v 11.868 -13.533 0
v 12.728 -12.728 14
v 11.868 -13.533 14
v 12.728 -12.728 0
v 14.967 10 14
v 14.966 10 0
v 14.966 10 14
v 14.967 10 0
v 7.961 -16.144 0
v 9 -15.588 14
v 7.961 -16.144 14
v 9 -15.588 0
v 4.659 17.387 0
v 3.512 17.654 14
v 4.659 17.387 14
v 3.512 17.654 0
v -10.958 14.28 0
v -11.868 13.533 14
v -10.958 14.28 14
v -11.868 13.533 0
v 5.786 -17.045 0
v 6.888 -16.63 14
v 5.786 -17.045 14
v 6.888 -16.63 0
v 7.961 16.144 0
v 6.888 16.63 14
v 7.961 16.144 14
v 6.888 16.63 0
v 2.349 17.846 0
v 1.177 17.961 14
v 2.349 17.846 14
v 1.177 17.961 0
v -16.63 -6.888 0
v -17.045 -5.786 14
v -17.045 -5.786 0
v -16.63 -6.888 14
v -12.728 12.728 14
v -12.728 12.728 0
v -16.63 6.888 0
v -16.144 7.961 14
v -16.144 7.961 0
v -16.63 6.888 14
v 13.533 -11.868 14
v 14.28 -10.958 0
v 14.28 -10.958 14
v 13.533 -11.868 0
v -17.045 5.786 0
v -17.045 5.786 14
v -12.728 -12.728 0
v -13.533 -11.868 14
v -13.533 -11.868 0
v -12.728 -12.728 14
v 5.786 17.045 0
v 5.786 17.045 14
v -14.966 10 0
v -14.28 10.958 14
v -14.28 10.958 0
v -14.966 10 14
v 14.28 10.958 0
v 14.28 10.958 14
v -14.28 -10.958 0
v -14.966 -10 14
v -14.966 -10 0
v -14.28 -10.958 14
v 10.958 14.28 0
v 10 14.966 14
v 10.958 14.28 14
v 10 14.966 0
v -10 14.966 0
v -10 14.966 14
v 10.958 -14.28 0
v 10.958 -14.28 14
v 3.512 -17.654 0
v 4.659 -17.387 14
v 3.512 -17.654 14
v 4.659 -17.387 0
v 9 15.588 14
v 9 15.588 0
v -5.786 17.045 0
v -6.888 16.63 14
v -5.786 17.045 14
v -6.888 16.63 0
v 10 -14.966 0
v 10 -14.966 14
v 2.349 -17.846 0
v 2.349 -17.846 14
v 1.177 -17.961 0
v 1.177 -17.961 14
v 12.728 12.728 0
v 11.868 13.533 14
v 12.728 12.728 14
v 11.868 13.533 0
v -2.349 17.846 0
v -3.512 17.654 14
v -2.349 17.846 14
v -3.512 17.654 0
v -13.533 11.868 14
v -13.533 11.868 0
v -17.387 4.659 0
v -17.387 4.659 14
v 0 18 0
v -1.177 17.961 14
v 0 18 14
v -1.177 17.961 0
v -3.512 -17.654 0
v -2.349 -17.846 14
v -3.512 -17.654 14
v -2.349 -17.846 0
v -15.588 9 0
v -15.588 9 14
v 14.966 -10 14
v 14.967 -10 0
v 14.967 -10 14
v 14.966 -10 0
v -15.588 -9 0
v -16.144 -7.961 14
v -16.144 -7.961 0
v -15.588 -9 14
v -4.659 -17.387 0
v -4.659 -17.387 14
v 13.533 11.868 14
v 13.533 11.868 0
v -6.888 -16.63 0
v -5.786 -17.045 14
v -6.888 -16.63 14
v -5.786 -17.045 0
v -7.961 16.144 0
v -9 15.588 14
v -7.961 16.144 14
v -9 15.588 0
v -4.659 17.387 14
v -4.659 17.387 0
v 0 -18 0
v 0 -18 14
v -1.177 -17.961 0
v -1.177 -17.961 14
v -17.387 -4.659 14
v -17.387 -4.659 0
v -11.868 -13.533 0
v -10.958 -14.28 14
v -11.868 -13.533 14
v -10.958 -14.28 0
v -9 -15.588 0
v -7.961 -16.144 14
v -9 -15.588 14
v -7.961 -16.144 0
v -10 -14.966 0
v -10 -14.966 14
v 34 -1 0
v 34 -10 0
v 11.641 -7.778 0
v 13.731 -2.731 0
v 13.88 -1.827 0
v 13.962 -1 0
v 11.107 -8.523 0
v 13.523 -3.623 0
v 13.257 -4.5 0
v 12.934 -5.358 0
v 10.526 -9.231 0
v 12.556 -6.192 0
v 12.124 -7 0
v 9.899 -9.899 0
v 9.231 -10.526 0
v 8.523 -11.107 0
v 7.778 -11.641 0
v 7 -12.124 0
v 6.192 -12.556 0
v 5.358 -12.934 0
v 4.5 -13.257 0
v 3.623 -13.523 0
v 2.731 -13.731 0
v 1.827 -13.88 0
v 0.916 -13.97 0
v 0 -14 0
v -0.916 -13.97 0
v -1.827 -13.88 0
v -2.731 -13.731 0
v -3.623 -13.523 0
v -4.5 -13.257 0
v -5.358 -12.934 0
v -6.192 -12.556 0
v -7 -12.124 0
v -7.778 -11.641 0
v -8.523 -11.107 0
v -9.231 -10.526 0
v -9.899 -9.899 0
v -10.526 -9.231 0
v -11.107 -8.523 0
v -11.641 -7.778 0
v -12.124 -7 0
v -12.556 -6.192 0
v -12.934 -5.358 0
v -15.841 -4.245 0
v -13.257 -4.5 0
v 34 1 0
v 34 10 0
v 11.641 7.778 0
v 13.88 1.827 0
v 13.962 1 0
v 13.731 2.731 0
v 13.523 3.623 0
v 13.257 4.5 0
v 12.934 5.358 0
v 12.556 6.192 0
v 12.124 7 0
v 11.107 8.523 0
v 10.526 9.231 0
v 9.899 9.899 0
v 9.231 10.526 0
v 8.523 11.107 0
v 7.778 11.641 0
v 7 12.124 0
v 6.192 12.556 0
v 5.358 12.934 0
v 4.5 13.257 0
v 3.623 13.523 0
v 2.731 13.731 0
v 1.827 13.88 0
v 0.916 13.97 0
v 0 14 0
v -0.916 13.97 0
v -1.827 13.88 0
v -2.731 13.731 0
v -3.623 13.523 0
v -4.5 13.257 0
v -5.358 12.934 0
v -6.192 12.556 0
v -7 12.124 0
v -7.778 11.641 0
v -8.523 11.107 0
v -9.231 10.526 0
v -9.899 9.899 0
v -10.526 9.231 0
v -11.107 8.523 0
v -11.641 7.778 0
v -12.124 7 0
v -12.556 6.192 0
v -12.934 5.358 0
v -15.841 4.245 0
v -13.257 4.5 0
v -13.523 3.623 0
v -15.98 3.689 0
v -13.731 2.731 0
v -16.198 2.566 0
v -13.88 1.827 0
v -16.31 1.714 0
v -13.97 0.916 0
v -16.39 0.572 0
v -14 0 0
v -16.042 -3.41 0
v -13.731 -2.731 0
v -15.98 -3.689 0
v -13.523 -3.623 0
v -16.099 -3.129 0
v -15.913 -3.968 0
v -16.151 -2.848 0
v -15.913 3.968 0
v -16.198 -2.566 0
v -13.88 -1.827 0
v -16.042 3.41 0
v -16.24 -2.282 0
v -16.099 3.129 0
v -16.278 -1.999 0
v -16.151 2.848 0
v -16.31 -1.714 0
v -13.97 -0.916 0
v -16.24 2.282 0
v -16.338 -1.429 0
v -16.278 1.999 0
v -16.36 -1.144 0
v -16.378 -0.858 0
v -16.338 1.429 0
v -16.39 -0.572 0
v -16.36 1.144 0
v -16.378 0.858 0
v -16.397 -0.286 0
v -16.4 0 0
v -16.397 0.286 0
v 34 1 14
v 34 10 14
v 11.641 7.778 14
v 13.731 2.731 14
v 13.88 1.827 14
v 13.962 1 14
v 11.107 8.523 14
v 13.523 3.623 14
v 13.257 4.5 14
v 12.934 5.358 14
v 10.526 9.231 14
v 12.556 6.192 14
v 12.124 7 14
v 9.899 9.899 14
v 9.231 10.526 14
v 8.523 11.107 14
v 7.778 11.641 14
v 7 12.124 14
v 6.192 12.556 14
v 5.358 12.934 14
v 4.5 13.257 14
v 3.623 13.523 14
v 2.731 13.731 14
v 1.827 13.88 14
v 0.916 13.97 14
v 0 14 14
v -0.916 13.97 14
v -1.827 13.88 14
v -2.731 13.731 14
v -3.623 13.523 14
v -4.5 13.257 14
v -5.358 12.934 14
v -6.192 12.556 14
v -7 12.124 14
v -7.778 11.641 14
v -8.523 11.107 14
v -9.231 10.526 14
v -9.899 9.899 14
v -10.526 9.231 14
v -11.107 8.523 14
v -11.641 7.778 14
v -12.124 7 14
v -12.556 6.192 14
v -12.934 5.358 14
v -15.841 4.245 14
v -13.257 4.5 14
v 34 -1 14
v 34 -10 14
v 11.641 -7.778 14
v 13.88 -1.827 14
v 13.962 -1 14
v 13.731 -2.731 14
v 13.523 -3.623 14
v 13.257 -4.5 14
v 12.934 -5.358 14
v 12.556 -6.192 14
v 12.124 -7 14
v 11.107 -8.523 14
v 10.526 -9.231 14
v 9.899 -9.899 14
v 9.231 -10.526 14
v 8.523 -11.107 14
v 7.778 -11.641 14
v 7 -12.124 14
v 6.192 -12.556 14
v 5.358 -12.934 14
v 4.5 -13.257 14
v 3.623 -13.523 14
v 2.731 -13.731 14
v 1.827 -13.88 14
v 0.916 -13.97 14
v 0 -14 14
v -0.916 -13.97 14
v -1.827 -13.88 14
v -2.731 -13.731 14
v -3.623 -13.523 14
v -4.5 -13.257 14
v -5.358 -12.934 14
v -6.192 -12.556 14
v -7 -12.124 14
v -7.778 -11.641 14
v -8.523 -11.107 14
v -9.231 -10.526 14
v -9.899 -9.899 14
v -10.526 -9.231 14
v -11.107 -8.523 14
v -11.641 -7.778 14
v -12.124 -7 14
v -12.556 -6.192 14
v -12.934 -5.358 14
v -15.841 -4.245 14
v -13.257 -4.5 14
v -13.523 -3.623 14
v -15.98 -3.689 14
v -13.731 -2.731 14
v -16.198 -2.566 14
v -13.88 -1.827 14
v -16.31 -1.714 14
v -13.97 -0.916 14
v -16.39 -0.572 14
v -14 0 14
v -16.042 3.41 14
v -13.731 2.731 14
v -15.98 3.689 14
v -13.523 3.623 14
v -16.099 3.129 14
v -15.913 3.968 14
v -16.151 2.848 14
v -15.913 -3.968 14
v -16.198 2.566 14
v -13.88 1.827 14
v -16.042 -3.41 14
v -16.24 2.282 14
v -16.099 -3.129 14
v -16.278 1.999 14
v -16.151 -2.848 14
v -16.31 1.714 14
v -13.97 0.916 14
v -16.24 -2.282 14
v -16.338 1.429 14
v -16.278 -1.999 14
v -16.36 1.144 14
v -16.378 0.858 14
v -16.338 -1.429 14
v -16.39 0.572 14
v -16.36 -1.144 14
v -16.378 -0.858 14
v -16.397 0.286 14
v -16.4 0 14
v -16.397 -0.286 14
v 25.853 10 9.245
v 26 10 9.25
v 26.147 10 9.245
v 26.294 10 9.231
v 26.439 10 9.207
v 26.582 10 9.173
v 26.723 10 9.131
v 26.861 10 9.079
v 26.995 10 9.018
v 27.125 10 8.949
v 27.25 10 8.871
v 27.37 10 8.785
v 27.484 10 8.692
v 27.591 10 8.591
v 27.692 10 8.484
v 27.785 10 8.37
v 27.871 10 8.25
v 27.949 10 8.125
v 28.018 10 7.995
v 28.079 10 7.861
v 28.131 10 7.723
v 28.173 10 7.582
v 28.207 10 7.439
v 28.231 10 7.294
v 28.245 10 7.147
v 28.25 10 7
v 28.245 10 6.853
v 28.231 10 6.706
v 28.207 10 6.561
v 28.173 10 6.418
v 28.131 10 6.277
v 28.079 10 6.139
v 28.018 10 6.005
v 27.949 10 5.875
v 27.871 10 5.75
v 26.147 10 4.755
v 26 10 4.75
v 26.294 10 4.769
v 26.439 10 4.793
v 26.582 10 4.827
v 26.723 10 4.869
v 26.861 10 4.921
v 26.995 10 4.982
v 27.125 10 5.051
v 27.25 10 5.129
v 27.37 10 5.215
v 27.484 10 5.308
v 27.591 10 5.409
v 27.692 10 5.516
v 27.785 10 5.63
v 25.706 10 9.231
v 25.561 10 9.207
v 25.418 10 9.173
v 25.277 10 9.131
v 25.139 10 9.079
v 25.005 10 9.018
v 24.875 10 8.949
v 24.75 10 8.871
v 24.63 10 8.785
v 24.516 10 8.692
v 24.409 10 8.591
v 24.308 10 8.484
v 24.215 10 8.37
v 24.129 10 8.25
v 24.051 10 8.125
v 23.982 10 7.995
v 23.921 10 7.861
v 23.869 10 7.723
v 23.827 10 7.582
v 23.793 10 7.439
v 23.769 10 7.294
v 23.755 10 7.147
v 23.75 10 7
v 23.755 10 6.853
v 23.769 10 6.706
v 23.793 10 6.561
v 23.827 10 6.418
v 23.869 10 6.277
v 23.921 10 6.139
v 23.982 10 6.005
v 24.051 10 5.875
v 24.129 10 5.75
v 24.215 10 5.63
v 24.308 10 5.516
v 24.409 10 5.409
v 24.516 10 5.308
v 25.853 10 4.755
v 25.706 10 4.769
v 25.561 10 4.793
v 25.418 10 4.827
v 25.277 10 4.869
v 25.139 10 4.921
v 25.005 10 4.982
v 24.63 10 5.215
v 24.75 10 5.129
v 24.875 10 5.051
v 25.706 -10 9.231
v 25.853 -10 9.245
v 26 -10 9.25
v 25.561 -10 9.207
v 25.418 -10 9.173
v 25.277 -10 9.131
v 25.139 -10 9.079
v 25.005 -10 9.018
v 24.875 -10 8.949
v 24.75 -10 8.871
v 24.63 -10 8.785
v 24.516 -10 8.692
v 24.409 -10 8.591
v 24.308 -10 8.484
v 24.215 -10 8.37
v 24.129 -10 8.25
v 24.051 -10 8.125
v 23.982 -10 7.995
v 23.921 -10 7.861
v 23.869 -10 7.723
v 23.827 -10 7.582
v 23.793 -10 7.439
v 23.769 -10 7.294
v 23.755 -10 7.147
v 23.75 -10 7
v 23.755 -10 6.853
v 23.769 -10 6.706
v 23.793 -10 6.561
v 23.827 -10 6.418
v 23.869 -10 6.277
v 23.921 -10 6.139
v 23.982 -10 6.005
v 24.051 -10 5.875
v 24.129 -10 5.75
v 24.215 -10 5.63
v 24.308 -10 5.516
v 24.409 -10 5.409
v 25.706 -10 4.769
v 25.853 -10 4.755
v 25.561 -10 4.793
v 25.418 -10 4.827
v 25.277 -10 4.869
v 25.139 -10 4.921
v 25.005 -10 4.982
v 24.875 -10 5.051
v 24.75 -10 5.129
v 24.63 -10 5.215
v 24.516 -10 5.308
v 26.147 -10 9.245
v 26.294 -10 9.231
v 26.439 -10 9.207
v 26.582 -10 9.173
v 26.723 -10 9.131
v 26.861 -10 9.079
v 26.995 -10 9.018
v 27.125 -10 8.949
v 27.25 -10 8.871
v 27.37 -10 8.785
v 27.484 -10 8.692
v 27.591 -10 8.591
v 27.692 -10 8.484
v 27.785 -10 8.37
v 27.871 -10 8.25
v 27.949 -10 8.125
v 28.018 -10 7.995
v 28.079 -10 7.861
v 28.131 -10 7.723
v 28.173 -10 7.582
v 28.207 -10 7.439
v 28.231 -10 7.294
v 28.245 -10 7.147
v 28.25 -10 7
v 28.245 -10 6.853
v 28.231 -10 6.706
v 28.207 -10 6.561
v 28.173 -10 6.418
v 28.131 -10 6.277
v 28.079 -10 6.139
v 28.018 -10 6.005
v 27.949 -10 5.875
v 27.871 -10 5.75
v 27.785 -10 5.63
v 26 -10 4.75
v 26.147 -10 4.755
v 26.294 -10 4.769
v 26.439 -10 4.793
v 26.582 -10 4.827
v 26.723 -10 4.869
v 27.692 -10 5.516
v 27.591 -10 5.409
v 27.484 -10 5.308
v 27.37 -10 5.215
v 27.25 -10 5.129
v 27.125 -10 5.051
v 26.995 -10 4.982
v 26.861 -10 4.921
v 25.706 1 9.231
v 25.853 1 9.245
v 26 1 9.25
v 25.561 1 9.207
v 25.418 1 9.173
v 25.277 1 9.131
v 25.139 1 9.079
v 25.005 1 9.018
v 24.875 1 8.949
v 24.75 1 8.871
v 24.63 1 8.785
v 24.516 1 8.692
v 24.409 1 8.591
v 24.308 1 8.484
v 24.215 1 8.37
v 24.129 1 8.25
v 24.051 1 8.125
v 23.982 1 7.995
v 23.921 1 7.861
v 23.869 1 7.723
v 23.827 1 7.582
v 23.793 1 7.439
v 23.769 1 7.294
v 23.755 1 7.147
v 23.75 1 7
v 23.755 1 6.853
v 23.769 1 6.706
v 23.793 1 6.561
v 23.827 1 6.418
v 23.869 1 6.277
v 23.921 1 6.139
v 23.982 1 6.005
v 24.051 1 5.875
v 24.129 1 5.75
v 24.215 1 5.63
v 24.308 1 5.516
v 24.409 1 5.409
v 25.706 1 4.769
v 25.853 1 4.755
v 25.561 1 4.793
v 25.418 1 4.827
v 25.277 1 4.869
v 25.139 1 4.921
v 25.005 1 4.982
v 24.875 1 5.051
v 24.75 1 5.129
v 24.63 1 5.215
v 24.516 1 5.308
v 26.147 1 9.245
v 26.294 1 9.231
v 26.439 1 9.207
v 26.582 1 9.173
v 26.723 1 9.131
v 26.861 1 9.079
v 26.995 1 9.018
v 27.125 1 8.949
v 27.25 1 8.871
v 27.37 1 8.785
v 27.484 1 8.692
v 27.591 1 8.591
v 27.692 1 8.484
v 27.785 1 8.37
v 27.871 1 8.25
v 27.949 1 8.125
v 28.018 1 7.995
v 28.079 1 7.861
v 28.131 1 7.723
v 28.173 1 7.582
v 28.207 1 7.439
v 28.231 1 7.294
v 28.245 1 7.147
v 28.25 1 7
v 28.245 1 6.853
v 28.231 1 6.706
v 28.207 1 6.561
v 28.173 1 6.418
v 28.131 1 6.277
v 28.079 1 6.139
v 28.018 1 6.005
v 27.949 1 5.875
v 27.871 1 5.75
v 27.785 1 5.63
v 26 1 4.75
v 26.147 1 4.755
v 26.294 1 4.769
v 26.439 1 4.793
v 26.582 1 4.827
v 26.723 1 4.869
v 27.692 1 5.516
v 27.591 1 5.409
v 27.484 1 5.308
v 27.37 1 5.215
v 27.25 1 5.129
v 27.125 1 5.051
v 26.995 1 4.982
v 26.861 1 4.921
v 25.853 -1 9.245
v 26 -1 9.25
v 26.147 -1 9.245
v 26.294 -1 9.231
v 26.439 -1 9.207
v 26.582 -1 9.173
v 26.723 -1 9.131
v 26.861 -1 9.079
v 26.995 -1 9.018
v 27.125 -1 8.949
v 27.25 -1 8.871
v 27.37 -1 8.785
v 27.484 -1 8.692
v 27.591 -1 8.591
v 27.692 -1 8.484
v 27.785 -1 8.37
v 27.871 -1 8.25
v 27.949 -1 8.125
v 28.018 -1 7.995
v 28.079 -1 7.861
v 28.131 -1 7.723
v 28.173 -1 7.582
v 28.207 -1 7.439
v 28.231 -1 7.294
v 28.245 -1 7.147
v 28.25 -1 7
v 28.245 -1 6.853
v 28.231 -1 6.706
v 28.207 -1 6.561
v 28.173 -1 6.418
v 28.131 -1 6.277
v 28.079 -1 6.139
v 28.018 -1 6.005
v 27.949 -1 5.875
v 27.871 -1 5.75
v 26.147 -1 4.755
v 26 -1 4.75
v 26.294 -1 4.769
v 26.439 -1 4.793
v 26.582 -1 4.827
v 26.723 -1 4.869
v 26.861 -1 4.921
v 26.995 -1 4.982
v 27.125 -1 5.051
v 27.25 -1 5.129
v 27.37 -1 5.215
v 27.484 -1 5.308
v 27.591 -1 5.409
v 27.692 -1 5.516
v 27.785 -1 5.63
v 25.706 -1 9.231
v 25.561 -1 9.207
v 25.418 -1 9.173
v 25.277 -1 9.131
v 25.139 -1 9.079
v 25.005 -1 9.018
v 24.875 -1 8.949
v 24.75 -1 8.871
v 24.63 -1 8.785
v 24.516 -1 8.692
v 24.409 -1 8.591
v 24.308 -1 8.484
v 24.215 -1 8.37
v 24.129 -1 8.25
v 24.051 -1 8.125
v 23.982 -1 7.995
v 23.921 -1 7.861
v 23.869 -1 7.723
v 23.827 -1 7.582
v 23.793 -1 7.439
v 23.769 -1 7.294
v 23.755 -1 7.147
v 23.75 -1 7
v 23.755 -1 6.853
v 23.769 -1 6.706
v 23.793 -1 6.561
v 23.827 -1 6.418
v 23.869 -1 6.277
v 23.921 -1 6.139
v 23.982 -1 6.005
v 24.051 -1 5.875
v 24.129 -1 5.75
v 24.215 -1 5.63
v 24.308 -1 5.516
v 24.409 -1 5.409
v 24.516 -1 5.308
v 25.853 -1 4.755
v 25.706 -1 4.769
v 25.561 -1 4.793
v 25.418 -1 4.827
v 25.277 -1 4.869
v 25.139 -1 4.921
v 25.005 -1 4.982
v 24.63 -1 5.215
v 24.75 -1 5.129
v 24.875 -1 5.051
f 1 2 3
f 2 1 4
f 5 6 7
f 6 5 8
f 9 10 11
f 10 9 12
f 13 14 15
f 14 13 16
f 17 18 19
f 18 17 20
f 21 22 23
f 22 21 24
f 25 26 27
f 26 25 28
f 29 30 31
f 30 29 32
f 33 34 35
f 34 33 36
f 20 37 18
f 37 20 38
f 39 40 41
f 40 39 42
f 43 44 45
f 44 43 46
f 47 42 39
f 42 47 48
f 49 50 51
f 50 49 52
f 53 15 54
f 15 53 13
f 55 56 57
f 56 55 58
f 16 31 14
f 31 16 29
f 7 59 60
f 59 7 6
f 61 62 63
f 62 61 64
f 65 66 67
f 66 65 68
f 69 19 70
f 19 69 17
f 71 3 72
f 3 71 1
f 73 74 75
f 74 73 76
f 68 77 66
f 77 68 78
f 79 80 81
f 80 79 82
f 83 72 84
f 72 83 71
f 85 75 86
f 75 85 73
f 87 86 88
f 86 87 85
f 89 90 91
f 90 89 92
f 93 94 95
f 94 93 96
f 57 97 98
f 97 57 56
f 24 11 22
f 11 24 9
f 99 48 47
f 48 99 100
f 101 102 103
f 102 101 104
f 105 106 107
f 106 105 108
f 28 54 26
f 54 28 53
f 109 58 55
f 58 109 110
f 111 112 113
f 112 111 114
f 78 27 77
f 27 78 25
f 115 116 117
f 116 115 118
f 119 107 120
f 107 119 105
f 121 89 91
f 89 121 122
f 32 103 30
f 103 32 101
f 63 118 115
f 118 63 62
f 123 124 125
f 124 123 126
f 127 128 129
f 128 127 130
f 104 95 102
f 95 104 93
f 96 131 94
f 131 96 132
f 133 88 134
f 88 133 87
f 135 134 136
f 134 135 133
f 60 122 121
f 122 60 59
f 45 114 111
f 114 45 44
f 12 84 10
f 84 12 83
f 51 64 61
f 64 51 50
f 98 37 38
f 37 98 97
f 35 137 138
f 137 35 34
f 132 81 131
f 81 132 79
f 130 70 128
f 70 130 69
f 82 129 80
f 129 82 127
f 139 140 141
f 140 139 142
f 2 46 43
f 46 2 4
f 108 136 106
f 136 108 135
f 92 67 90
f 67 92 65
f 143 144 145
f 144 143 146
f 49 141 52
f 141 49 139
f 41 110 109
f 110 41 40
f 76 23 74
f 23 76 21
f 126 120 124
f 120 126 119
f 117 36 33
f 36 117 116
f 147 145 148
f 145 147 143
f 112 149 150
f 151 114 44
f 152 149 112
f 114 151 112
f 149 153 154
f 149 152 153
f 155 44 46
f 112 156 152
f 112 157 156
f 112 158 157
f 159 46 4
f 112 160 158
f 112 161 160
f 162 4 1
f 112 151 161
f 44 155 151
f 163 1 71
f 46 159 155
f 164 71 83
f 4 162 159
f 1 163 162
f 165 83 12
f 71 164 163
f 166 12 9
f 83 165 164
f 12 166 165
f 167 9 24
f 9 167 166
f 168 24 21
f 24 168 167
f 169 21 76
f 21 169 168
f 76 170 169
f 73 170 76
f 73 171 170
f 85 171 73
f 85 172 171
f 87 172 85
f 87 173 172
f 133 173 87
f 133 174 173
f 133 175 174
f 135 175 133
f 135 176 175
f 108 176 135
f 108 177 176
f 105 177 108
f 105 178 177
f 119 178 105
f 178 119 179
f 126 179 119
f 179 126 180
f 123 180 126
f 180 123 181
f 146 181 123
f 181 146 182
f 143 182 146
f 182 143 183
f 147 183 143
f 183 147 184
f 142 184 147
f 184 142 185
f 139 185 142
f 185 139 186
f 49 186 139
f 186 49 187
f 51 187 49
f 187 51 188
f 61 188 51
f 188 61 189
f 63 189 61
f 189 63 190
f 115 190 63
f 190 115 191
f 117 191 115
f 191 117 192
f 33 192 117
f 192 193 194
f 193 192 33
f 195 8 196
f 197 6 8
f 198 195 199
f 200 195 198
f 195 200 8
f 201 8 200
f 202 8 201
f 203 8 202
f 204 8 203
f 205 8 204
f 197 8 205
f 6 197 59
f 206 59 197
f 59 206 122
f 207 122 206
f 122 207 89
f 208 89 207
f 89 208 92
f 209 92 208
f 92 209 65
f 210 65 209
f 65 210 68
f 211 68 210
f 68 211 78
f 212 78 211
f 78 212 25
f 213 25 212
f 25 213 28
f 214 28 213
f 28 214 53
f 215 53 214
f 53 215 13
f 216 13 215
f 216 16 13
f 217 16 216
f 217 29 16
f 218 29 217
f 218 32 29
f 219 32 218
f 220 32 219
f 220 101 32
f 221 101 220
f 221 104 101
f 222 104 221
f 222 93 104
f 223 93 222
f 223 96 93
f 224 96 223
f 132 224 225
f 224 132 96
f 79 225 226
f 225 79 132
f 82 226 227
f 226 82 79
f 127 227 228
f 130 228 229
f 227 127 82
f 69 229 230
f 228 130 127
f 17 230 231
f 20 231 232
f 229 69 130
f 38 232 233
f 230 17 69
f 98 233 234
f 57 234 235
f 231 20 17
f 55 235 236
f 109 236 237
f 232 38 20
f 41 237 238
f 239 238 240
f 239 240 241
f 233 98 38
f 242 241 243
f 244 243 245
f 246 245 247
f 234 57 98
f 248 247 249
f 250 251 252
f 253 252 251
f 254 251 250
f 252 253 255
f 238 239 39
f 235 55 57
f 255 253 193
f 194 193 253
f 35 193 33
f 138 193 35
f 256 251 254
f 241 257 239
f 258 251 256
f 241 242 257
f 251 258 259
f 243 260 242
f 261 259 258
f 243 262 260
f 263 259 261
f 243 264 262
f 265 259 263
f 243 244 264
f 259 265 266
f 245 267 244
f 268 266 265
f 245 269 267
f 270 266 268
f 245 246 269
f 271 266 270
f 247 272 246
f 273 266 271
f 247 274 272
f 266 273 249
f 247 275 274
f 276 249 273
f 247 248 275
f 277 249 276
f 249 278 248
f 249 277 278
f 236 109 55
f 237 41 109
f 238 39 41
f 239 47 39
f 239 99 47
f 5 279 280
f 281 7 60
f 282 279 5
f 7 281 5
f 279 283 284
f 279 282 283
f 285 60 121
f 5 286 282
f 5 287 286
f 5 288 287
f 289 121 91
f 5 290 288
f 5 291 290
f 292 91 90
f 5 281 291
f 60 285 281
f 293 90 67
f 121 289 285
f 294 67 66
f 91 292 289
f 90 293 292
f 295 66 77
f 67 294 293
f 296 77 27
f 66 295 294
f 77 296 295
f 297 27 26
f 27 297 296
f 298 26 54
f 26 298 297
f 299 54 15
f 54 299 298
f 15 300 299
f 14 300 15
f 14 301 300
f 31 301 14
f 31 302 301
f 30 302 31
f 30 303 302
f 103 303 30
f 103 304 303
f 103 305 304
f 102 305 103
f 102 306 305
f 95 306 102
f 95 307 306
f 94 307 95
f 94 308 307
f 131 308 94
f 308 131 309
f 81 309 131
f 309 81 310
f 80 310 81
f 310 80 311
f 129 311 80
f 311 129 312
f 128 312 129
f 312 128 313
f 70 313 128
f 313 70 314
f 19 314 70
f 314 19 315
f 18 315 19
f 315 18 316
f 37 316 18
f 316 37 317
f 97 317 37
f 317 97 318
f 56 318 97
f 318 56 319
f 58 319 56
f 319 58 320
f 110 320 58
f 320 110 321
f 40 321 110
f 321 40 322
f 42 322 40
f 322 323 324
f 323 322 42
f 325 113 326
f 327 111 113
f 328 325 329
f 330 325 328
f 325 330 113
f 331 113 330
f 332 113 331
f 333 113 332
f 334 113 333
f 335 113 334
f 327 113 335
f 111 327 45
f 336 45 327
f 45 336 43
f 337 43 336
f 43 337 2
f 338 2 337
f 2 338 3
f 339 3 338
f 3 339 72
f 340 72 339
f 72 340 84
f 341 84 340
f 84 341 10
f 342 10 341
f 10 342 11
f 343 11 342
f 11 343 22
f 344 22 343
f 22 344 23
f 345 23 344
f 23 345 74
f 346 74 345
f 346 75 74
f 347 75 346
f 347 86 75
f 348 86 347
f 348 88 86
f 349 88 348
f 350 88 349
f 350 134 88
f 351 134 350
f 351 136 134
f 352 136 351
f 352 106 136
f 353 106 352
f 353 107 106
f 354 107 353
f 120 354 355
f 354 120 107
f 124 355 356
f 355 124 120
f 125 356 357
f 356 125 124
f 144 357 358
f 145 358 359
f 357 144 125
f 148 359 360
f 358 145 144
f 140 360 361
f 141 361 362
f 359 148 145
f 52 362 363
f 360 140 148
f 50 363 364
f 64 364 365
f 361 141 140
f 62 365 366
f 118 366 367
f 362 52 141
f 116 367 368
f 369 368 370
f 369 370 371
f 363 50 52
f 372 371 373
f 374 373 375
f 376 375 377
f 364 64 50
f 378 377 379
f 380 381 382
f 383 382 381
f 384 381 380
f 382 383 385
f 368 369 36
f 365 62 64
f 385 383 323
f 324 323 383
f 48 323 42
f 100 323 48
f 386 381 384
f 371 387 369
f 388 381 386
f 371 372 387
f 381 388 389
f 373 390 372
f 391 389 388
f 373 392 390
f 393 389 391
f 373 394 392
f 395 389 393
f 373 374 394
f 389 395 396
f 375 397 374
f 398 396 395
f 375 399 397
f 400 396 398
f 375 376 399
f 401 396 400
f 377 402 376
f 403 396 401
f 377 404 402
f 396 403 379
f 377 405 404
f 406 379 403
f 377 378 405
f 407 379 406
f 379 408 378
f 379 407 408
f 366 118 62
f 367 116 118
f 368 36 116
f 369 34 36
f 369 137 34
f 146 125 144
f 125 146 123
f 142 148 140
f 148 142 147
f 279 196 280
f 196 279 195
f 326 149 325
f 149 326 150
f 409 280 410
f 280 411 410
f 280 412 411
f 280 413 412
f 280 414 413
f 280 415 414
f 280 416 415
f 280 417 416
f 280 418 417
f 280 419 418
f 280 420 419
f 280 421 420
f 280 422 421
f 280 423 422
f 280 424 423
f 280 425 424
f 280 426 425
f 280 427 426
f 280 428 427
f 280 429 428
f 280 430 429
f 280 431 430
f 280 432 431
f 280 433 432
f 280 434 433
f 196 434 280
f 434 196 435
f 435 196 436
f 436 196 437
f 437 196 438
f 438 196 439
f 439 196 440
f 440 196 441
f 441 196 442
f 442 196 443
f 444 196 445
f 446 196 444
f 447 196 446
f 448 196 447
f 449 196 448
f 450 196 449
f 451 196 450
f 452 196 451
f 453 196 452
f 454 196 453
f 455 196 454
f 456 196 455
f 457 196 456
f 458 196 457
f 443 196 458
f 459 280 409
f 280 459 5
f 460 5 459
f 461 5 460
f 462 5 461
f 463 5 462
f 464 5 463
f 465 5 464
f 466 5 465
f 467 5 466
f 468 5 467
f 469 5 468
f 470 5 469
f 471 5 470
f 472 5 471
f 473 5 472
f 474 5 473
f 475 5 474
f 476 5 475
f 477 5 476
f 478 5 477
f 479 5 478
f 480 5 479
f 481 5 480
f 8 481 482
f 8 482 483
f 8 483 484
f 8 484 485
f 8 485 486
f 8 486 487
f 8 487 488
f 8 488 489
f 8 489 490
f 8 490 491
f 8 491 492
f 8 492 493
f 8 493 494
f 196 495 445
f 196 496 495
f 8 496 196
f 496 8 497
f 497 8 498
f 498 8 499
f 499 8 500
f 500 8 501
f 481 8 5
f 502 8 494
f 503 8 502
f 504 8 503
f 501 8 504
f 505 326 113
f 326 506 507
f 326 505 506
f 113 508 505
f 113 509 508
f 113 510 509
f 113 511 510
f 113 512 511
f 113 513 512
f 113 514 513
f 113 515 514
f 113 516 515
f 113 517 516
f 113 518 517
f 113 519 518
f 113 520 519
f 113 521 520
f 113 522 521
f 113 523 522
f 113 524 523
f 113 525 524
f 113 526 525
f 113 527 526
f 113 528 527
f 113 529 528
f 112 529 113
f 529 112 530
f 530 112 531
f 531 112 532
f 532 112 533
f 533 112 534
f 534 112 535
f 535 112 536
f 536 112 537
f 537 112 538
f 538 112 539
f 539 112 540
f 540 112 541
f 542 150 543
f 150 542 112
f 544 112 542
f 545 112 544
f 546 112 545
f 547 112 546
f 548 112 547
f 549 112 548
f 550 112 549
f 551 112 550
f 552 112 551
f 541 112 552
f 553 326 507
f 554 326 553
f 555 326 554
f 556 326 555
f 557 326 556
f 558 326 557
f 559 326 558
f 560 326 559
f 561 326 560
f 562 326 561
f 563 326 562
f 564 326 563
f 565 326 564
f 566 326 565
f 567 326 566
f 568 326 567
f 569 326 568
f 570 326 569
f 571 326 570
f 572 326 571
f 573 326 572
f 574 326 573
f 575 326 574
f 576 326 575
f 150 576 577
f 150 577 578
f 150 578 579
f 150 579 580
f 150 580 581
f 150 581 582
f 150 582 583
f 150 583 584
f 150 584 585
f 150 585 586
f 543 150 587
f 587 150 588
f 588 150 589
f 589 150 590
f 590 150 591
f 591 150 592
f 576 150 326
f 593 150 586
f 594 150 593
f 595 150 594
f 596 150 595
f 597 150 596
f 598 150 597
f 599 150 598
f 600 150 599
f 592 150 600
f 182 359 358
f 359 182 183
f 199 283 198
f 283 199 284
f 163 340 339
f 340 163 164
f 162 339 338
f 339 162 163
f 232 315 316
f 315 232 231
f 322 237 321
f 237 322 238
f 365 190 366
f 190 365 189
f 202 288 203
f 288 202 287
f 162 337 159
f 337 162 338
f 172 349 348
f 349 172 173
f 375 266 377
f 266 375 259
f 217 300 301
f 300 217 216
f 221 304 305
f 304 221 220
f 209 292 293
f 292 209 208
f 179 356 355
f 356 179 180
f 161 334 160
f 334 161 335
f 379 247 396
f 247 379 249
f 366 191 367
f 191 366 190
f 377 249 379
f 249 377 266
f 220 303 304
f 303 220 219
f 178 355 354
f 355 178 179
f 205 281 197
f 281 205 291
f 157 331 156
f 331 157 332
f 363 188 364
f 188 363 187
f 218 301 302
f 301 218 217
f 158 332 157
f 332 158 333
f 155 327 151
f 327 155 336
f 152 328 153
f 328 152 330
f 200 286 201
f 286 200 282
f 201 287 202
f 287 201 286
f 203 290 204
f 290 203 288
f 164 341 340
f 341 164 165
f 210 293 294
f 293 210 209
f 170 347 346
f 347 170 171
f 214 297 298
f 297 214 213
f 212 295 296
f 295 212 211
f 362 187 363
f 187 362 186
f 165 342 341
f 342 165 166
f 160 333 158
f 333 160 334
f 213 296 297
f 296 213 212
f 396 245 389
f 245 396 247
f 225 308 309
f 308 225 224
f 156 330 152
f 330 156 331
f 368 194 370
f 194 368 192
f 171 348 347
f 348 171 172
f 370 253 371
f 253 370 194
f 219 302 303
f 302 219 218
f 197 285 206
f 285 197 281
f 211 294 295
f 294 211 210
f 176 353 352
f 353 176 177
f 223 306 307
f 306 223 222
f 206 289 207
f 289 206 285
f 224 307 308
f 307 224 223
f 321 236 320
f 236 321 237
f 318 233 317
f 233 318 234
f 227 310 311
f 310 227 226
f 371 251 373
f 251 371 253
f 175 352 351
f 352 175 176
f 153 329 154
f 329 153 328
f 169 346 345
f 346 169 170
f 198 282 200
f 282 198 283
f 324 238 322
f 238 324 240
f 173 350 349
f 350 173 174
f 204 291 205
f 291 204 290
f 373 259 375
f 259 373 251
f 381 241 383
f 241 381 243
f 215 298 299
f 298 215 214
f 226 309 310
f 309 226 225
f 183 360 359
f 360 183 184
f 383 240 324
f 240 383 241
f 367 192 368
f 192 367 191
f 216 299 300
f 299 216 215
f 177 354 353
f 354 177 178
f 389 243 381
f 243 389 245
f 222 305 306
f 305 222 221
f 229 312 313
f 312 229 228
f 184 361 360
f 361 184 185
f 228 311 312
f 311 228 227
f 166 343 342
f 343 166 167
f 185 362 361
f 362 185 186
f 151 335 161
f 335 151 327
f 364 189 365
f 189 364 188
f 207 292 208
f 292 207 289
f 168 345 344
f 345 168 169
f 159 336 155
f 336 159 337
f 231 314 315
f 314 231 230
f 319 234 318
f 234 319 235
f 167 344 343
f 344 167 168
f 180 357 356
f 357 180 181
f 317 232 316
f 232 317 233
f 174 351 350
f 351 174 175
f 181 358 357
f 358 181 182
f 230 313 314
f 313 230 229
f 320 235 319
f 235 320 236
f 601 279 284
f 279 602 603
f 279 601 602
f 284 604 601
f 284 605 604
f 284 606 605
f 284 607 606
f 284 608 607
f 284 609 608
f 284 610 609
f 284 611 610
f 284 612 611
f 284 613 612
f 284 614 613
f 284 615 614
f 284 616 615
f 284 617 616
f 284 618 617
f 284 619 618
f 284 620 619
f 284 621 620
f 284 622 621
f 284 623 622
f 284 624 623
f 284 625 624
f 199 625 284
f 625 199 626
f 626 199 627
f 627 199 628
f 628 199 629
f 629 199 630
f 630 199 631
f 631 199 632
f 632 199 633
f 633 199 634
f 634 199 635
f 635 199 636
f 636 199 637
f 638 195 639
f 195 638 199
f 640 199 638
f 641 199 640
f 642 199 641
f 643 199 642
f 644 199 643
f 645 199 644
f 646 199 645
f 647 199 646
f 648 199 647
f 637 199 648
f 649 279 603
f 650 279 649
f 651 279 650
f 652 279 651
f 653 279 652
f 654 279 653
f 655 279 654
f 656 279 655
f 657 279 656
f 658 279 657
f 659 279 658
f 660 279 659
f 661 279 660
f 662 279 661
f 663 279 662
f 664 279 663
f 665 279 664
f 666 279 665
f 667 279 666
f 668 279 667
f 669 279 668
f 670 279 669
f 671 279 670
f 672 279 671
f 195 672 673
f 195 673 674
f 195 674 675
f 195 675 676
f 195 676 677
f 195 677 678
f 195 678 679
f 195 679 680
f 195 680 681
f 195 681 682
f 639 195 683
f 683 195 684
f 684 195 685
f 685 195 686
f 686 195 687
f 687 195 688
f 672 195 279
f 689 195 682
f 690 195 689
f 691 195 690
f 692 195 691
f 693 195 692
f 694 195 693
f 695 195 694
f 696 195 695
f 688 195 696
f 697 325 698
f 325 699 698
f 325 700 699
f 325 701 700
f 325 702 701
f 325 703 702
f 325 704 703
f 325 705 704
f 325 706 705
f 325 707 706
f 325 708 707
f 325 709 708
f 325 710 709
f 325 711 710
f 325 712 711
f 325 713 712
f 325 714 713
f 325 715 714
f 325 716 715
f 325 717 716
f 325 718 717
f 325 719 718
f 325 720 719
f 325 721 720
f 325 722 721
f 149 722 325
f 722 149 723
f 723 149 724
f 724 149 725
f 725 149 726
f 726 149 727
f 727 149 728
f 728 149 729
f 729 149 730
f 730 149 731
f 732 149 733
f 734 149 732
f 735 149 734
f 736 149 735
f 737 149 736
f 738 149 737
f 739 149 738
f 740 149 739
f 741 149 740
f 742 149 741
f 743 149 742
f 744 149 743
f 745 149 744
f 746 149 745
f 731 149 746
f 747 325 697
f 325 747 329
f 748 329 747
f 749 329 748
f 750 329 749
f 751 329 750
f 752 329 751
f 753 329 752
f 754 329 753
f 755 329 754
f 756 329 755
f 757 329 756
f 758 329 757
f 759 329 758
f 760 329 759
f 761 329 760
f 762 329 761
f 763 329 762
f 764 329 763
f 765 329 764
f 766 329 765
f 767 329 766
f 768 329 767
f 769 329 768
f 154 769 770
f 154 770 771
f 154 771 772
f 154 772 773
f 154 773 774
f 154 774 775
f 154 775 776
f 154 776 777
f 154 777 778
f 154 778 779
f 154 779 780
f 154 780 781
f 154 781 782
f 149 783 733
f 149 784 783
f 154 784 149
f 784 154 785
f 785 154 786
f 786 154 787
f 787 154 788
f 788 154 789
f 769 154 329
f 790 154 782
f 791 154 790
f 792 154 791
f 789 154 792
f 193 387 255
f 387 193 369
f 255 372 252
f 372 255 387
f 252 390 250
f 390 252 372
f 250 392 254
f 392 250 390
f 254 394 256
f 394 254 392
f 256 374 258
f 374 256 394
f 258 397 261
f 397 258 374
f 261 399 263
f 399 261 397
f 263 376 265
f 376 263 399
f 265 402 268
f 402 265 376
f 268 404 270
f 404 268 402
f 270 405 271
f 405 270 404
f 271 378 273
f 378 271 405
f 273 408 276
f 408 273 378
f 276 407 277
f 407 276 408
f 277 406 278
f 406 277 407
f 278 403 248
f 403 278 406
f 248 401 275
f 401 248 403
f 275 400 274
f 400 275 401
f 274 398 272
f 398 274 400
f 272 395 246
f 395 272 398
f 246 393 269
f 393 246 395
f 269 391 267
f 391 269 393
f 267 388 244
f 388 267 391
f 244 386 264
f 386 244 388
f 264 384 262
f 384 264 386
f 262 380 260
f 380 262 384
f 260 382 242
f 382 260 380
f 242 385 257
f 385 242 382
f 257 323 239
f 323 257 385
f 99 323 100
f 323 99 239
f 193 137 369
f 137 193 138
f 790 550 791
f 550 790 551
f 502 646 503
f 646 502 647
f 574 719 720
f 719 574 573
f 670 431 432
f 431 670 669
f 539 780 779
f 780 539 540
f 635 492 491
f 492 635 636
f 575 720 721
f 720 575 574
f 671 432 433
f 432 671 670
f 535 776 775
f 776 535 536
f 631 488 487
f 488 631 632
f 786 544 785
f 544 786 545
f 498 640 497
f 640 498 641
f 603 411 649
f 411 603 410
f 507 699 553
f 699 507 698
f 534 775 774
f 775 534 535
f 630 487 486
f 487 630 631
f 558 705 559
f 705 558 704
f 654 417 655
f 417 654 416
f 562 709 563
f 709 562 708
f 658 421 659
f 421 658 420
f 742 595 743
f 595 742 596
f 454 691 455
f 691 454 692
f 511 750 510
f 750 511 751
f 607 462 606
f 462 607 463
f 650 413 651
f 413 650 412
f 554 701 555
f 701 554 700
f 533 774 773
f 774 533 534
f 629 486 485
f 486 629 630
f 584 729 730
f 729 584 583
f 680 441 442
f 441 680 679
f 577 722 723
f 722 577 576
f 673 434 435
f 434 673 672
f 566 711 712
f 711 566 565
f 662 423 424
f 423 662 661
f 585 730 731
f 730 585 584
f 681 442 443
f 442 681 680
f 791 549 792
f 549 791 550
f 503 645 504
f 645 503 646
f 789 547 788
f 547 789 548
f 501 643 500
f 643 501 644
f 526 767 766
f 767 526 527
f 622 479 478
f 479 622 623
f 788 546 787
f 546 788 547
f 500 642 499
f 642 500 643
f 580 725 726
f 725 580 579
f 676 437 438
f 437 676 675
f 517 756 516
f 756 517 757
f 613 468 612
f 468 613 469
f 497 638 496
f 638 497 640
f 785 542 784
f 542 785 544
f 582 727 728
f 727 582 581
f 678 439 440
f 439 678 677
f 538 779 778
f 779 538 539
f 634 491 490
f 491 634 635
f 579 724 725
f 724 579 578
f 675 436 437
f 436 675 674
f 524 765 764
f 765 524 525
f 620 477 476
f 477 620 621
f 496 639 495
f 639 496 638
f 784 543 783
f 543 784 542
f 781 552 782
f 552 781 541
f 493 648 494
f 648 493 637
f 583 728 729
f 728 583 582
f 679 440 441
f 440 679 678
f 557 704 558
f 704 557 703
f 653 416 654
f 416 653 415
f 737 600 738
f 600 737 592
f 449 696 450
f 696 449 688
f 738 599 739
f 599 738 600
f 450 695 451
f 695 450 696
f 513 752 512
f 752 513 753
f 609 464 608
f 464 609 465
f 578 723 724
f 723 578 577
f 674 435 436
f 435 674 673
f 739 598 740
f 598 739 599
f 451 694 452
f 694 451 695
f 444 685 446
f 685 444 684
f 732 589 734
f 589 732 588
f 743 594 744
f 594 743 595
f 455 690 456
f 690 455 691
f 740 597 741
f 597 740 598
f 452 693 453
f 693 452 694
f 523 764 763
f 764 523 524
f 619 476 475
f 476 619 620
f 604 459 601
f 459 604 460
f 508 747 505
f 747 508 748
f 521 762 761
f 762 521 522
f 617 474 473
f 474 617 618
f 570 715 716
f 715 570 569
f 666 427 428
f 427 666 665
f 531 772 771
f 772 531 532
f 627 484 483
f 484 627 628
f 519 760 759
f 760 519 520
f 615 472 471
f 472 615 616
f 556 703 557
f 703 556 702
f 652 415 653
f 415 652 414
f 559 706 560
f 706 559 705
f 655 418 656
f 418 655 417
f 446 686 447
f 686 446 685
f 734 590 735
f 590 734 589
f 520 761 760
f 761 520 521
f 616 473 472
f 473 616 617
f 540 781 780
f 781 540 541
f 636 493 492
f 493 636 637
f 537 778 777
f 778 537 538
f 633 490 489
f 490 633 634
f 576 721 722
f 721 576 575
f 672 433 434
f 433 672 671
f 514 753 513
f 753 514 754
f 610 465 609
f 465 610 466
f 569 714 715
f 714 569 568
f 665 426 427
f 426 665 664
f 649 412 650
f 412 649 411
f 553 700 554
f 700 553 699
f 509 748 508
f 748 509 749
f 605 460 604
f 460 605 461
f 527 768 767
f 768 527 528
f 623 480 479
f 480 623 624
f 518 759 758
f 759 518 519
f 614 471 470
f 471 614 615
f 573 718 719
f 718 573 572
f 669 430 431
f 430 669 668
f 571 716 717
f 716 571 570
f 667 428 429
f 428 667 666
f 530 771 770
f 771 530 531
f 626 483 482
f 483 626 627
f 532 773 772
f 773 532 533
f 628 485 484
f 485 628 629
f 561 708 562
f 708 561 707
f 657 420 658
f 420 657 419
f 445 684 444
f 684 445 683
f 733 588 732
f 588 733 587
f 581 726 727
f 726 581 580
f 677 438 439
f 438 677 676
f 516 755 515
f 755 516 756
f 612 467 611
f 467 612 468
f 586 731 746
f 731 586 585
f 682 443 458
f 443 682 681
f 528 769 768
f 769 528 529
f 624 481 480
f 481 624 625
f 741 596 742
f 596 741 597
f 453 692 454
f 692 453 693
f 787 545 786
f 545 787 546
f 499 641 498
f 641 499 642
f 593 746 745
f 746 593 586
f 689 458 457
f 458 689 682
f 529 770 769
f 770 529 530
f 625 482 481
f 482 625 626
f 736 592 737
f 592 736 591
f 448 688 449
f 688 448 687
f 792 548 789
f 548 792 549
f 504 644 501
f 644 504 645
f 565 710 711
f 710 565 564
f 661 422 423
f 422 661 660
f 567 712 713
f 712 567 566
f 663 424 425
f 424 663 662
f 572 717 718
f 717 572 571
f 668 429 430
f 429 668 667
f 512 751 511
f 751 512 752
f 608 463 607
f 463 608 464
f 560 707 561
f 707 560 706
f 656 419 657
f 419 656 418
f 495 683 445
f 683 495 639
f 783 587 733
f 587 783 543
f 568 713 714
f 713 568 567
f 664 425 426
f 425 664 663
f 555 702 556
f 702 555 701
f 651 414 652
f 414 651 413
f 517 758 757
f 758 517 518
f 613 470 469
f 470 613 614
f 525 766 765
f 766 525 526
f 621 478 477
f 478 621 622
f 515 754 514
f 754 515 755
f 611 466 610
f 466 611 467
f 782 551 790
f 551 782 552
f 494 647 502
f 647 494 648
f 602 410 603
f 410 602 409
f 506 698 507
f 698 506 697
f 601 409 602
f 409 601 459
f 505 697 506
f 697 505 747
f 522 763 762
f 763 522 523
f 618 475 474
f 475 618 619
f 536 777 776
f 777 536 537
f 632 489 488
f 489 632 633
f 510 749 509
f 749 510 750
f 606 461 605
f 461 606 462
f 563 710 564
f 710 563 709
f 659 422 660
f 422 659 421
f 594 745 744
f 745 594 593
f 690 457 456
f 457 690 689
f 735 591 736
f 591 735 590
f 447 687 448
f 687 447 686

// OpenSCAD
// t4-010 hinged tube clamp
tube_diameter = 28;
wall_thickness = 4;
bolt_hole_diameter = 4.5;
height = 14;
gap = 2;
flexure_r = 16.4;
$fn = 96;

ri = tube_diameter / 2;
ro = ri + wall_thickness;
difference() {
    union() {
        cylinder(r = ro, h = height);
        translate([14, -10, 0]) cube([20, 20, height]);
    }
    translate([0, 0, -1]) cylinder(r = ri, h = height + 2);
    translate([0, -gap/2, -1]) cube([35, gap, height + 2]);
    // flexure groove: 30 deg annular sector centred on -X
    translate([0, 0, -1]) linear_extrude(height = height + 2)
        polygon(concat([for (a = [165:1:195]) flexure_r * [cos(a), sin(a)]],
                       [for (a = [195:-1:165]) (ro + 1) * [cos(a), sin(a)]]));
    translate([26, -11, 7]) rotate([-90, 0, 0]) cylinder(d = bolt_hole_diameter, h = 22);
}
